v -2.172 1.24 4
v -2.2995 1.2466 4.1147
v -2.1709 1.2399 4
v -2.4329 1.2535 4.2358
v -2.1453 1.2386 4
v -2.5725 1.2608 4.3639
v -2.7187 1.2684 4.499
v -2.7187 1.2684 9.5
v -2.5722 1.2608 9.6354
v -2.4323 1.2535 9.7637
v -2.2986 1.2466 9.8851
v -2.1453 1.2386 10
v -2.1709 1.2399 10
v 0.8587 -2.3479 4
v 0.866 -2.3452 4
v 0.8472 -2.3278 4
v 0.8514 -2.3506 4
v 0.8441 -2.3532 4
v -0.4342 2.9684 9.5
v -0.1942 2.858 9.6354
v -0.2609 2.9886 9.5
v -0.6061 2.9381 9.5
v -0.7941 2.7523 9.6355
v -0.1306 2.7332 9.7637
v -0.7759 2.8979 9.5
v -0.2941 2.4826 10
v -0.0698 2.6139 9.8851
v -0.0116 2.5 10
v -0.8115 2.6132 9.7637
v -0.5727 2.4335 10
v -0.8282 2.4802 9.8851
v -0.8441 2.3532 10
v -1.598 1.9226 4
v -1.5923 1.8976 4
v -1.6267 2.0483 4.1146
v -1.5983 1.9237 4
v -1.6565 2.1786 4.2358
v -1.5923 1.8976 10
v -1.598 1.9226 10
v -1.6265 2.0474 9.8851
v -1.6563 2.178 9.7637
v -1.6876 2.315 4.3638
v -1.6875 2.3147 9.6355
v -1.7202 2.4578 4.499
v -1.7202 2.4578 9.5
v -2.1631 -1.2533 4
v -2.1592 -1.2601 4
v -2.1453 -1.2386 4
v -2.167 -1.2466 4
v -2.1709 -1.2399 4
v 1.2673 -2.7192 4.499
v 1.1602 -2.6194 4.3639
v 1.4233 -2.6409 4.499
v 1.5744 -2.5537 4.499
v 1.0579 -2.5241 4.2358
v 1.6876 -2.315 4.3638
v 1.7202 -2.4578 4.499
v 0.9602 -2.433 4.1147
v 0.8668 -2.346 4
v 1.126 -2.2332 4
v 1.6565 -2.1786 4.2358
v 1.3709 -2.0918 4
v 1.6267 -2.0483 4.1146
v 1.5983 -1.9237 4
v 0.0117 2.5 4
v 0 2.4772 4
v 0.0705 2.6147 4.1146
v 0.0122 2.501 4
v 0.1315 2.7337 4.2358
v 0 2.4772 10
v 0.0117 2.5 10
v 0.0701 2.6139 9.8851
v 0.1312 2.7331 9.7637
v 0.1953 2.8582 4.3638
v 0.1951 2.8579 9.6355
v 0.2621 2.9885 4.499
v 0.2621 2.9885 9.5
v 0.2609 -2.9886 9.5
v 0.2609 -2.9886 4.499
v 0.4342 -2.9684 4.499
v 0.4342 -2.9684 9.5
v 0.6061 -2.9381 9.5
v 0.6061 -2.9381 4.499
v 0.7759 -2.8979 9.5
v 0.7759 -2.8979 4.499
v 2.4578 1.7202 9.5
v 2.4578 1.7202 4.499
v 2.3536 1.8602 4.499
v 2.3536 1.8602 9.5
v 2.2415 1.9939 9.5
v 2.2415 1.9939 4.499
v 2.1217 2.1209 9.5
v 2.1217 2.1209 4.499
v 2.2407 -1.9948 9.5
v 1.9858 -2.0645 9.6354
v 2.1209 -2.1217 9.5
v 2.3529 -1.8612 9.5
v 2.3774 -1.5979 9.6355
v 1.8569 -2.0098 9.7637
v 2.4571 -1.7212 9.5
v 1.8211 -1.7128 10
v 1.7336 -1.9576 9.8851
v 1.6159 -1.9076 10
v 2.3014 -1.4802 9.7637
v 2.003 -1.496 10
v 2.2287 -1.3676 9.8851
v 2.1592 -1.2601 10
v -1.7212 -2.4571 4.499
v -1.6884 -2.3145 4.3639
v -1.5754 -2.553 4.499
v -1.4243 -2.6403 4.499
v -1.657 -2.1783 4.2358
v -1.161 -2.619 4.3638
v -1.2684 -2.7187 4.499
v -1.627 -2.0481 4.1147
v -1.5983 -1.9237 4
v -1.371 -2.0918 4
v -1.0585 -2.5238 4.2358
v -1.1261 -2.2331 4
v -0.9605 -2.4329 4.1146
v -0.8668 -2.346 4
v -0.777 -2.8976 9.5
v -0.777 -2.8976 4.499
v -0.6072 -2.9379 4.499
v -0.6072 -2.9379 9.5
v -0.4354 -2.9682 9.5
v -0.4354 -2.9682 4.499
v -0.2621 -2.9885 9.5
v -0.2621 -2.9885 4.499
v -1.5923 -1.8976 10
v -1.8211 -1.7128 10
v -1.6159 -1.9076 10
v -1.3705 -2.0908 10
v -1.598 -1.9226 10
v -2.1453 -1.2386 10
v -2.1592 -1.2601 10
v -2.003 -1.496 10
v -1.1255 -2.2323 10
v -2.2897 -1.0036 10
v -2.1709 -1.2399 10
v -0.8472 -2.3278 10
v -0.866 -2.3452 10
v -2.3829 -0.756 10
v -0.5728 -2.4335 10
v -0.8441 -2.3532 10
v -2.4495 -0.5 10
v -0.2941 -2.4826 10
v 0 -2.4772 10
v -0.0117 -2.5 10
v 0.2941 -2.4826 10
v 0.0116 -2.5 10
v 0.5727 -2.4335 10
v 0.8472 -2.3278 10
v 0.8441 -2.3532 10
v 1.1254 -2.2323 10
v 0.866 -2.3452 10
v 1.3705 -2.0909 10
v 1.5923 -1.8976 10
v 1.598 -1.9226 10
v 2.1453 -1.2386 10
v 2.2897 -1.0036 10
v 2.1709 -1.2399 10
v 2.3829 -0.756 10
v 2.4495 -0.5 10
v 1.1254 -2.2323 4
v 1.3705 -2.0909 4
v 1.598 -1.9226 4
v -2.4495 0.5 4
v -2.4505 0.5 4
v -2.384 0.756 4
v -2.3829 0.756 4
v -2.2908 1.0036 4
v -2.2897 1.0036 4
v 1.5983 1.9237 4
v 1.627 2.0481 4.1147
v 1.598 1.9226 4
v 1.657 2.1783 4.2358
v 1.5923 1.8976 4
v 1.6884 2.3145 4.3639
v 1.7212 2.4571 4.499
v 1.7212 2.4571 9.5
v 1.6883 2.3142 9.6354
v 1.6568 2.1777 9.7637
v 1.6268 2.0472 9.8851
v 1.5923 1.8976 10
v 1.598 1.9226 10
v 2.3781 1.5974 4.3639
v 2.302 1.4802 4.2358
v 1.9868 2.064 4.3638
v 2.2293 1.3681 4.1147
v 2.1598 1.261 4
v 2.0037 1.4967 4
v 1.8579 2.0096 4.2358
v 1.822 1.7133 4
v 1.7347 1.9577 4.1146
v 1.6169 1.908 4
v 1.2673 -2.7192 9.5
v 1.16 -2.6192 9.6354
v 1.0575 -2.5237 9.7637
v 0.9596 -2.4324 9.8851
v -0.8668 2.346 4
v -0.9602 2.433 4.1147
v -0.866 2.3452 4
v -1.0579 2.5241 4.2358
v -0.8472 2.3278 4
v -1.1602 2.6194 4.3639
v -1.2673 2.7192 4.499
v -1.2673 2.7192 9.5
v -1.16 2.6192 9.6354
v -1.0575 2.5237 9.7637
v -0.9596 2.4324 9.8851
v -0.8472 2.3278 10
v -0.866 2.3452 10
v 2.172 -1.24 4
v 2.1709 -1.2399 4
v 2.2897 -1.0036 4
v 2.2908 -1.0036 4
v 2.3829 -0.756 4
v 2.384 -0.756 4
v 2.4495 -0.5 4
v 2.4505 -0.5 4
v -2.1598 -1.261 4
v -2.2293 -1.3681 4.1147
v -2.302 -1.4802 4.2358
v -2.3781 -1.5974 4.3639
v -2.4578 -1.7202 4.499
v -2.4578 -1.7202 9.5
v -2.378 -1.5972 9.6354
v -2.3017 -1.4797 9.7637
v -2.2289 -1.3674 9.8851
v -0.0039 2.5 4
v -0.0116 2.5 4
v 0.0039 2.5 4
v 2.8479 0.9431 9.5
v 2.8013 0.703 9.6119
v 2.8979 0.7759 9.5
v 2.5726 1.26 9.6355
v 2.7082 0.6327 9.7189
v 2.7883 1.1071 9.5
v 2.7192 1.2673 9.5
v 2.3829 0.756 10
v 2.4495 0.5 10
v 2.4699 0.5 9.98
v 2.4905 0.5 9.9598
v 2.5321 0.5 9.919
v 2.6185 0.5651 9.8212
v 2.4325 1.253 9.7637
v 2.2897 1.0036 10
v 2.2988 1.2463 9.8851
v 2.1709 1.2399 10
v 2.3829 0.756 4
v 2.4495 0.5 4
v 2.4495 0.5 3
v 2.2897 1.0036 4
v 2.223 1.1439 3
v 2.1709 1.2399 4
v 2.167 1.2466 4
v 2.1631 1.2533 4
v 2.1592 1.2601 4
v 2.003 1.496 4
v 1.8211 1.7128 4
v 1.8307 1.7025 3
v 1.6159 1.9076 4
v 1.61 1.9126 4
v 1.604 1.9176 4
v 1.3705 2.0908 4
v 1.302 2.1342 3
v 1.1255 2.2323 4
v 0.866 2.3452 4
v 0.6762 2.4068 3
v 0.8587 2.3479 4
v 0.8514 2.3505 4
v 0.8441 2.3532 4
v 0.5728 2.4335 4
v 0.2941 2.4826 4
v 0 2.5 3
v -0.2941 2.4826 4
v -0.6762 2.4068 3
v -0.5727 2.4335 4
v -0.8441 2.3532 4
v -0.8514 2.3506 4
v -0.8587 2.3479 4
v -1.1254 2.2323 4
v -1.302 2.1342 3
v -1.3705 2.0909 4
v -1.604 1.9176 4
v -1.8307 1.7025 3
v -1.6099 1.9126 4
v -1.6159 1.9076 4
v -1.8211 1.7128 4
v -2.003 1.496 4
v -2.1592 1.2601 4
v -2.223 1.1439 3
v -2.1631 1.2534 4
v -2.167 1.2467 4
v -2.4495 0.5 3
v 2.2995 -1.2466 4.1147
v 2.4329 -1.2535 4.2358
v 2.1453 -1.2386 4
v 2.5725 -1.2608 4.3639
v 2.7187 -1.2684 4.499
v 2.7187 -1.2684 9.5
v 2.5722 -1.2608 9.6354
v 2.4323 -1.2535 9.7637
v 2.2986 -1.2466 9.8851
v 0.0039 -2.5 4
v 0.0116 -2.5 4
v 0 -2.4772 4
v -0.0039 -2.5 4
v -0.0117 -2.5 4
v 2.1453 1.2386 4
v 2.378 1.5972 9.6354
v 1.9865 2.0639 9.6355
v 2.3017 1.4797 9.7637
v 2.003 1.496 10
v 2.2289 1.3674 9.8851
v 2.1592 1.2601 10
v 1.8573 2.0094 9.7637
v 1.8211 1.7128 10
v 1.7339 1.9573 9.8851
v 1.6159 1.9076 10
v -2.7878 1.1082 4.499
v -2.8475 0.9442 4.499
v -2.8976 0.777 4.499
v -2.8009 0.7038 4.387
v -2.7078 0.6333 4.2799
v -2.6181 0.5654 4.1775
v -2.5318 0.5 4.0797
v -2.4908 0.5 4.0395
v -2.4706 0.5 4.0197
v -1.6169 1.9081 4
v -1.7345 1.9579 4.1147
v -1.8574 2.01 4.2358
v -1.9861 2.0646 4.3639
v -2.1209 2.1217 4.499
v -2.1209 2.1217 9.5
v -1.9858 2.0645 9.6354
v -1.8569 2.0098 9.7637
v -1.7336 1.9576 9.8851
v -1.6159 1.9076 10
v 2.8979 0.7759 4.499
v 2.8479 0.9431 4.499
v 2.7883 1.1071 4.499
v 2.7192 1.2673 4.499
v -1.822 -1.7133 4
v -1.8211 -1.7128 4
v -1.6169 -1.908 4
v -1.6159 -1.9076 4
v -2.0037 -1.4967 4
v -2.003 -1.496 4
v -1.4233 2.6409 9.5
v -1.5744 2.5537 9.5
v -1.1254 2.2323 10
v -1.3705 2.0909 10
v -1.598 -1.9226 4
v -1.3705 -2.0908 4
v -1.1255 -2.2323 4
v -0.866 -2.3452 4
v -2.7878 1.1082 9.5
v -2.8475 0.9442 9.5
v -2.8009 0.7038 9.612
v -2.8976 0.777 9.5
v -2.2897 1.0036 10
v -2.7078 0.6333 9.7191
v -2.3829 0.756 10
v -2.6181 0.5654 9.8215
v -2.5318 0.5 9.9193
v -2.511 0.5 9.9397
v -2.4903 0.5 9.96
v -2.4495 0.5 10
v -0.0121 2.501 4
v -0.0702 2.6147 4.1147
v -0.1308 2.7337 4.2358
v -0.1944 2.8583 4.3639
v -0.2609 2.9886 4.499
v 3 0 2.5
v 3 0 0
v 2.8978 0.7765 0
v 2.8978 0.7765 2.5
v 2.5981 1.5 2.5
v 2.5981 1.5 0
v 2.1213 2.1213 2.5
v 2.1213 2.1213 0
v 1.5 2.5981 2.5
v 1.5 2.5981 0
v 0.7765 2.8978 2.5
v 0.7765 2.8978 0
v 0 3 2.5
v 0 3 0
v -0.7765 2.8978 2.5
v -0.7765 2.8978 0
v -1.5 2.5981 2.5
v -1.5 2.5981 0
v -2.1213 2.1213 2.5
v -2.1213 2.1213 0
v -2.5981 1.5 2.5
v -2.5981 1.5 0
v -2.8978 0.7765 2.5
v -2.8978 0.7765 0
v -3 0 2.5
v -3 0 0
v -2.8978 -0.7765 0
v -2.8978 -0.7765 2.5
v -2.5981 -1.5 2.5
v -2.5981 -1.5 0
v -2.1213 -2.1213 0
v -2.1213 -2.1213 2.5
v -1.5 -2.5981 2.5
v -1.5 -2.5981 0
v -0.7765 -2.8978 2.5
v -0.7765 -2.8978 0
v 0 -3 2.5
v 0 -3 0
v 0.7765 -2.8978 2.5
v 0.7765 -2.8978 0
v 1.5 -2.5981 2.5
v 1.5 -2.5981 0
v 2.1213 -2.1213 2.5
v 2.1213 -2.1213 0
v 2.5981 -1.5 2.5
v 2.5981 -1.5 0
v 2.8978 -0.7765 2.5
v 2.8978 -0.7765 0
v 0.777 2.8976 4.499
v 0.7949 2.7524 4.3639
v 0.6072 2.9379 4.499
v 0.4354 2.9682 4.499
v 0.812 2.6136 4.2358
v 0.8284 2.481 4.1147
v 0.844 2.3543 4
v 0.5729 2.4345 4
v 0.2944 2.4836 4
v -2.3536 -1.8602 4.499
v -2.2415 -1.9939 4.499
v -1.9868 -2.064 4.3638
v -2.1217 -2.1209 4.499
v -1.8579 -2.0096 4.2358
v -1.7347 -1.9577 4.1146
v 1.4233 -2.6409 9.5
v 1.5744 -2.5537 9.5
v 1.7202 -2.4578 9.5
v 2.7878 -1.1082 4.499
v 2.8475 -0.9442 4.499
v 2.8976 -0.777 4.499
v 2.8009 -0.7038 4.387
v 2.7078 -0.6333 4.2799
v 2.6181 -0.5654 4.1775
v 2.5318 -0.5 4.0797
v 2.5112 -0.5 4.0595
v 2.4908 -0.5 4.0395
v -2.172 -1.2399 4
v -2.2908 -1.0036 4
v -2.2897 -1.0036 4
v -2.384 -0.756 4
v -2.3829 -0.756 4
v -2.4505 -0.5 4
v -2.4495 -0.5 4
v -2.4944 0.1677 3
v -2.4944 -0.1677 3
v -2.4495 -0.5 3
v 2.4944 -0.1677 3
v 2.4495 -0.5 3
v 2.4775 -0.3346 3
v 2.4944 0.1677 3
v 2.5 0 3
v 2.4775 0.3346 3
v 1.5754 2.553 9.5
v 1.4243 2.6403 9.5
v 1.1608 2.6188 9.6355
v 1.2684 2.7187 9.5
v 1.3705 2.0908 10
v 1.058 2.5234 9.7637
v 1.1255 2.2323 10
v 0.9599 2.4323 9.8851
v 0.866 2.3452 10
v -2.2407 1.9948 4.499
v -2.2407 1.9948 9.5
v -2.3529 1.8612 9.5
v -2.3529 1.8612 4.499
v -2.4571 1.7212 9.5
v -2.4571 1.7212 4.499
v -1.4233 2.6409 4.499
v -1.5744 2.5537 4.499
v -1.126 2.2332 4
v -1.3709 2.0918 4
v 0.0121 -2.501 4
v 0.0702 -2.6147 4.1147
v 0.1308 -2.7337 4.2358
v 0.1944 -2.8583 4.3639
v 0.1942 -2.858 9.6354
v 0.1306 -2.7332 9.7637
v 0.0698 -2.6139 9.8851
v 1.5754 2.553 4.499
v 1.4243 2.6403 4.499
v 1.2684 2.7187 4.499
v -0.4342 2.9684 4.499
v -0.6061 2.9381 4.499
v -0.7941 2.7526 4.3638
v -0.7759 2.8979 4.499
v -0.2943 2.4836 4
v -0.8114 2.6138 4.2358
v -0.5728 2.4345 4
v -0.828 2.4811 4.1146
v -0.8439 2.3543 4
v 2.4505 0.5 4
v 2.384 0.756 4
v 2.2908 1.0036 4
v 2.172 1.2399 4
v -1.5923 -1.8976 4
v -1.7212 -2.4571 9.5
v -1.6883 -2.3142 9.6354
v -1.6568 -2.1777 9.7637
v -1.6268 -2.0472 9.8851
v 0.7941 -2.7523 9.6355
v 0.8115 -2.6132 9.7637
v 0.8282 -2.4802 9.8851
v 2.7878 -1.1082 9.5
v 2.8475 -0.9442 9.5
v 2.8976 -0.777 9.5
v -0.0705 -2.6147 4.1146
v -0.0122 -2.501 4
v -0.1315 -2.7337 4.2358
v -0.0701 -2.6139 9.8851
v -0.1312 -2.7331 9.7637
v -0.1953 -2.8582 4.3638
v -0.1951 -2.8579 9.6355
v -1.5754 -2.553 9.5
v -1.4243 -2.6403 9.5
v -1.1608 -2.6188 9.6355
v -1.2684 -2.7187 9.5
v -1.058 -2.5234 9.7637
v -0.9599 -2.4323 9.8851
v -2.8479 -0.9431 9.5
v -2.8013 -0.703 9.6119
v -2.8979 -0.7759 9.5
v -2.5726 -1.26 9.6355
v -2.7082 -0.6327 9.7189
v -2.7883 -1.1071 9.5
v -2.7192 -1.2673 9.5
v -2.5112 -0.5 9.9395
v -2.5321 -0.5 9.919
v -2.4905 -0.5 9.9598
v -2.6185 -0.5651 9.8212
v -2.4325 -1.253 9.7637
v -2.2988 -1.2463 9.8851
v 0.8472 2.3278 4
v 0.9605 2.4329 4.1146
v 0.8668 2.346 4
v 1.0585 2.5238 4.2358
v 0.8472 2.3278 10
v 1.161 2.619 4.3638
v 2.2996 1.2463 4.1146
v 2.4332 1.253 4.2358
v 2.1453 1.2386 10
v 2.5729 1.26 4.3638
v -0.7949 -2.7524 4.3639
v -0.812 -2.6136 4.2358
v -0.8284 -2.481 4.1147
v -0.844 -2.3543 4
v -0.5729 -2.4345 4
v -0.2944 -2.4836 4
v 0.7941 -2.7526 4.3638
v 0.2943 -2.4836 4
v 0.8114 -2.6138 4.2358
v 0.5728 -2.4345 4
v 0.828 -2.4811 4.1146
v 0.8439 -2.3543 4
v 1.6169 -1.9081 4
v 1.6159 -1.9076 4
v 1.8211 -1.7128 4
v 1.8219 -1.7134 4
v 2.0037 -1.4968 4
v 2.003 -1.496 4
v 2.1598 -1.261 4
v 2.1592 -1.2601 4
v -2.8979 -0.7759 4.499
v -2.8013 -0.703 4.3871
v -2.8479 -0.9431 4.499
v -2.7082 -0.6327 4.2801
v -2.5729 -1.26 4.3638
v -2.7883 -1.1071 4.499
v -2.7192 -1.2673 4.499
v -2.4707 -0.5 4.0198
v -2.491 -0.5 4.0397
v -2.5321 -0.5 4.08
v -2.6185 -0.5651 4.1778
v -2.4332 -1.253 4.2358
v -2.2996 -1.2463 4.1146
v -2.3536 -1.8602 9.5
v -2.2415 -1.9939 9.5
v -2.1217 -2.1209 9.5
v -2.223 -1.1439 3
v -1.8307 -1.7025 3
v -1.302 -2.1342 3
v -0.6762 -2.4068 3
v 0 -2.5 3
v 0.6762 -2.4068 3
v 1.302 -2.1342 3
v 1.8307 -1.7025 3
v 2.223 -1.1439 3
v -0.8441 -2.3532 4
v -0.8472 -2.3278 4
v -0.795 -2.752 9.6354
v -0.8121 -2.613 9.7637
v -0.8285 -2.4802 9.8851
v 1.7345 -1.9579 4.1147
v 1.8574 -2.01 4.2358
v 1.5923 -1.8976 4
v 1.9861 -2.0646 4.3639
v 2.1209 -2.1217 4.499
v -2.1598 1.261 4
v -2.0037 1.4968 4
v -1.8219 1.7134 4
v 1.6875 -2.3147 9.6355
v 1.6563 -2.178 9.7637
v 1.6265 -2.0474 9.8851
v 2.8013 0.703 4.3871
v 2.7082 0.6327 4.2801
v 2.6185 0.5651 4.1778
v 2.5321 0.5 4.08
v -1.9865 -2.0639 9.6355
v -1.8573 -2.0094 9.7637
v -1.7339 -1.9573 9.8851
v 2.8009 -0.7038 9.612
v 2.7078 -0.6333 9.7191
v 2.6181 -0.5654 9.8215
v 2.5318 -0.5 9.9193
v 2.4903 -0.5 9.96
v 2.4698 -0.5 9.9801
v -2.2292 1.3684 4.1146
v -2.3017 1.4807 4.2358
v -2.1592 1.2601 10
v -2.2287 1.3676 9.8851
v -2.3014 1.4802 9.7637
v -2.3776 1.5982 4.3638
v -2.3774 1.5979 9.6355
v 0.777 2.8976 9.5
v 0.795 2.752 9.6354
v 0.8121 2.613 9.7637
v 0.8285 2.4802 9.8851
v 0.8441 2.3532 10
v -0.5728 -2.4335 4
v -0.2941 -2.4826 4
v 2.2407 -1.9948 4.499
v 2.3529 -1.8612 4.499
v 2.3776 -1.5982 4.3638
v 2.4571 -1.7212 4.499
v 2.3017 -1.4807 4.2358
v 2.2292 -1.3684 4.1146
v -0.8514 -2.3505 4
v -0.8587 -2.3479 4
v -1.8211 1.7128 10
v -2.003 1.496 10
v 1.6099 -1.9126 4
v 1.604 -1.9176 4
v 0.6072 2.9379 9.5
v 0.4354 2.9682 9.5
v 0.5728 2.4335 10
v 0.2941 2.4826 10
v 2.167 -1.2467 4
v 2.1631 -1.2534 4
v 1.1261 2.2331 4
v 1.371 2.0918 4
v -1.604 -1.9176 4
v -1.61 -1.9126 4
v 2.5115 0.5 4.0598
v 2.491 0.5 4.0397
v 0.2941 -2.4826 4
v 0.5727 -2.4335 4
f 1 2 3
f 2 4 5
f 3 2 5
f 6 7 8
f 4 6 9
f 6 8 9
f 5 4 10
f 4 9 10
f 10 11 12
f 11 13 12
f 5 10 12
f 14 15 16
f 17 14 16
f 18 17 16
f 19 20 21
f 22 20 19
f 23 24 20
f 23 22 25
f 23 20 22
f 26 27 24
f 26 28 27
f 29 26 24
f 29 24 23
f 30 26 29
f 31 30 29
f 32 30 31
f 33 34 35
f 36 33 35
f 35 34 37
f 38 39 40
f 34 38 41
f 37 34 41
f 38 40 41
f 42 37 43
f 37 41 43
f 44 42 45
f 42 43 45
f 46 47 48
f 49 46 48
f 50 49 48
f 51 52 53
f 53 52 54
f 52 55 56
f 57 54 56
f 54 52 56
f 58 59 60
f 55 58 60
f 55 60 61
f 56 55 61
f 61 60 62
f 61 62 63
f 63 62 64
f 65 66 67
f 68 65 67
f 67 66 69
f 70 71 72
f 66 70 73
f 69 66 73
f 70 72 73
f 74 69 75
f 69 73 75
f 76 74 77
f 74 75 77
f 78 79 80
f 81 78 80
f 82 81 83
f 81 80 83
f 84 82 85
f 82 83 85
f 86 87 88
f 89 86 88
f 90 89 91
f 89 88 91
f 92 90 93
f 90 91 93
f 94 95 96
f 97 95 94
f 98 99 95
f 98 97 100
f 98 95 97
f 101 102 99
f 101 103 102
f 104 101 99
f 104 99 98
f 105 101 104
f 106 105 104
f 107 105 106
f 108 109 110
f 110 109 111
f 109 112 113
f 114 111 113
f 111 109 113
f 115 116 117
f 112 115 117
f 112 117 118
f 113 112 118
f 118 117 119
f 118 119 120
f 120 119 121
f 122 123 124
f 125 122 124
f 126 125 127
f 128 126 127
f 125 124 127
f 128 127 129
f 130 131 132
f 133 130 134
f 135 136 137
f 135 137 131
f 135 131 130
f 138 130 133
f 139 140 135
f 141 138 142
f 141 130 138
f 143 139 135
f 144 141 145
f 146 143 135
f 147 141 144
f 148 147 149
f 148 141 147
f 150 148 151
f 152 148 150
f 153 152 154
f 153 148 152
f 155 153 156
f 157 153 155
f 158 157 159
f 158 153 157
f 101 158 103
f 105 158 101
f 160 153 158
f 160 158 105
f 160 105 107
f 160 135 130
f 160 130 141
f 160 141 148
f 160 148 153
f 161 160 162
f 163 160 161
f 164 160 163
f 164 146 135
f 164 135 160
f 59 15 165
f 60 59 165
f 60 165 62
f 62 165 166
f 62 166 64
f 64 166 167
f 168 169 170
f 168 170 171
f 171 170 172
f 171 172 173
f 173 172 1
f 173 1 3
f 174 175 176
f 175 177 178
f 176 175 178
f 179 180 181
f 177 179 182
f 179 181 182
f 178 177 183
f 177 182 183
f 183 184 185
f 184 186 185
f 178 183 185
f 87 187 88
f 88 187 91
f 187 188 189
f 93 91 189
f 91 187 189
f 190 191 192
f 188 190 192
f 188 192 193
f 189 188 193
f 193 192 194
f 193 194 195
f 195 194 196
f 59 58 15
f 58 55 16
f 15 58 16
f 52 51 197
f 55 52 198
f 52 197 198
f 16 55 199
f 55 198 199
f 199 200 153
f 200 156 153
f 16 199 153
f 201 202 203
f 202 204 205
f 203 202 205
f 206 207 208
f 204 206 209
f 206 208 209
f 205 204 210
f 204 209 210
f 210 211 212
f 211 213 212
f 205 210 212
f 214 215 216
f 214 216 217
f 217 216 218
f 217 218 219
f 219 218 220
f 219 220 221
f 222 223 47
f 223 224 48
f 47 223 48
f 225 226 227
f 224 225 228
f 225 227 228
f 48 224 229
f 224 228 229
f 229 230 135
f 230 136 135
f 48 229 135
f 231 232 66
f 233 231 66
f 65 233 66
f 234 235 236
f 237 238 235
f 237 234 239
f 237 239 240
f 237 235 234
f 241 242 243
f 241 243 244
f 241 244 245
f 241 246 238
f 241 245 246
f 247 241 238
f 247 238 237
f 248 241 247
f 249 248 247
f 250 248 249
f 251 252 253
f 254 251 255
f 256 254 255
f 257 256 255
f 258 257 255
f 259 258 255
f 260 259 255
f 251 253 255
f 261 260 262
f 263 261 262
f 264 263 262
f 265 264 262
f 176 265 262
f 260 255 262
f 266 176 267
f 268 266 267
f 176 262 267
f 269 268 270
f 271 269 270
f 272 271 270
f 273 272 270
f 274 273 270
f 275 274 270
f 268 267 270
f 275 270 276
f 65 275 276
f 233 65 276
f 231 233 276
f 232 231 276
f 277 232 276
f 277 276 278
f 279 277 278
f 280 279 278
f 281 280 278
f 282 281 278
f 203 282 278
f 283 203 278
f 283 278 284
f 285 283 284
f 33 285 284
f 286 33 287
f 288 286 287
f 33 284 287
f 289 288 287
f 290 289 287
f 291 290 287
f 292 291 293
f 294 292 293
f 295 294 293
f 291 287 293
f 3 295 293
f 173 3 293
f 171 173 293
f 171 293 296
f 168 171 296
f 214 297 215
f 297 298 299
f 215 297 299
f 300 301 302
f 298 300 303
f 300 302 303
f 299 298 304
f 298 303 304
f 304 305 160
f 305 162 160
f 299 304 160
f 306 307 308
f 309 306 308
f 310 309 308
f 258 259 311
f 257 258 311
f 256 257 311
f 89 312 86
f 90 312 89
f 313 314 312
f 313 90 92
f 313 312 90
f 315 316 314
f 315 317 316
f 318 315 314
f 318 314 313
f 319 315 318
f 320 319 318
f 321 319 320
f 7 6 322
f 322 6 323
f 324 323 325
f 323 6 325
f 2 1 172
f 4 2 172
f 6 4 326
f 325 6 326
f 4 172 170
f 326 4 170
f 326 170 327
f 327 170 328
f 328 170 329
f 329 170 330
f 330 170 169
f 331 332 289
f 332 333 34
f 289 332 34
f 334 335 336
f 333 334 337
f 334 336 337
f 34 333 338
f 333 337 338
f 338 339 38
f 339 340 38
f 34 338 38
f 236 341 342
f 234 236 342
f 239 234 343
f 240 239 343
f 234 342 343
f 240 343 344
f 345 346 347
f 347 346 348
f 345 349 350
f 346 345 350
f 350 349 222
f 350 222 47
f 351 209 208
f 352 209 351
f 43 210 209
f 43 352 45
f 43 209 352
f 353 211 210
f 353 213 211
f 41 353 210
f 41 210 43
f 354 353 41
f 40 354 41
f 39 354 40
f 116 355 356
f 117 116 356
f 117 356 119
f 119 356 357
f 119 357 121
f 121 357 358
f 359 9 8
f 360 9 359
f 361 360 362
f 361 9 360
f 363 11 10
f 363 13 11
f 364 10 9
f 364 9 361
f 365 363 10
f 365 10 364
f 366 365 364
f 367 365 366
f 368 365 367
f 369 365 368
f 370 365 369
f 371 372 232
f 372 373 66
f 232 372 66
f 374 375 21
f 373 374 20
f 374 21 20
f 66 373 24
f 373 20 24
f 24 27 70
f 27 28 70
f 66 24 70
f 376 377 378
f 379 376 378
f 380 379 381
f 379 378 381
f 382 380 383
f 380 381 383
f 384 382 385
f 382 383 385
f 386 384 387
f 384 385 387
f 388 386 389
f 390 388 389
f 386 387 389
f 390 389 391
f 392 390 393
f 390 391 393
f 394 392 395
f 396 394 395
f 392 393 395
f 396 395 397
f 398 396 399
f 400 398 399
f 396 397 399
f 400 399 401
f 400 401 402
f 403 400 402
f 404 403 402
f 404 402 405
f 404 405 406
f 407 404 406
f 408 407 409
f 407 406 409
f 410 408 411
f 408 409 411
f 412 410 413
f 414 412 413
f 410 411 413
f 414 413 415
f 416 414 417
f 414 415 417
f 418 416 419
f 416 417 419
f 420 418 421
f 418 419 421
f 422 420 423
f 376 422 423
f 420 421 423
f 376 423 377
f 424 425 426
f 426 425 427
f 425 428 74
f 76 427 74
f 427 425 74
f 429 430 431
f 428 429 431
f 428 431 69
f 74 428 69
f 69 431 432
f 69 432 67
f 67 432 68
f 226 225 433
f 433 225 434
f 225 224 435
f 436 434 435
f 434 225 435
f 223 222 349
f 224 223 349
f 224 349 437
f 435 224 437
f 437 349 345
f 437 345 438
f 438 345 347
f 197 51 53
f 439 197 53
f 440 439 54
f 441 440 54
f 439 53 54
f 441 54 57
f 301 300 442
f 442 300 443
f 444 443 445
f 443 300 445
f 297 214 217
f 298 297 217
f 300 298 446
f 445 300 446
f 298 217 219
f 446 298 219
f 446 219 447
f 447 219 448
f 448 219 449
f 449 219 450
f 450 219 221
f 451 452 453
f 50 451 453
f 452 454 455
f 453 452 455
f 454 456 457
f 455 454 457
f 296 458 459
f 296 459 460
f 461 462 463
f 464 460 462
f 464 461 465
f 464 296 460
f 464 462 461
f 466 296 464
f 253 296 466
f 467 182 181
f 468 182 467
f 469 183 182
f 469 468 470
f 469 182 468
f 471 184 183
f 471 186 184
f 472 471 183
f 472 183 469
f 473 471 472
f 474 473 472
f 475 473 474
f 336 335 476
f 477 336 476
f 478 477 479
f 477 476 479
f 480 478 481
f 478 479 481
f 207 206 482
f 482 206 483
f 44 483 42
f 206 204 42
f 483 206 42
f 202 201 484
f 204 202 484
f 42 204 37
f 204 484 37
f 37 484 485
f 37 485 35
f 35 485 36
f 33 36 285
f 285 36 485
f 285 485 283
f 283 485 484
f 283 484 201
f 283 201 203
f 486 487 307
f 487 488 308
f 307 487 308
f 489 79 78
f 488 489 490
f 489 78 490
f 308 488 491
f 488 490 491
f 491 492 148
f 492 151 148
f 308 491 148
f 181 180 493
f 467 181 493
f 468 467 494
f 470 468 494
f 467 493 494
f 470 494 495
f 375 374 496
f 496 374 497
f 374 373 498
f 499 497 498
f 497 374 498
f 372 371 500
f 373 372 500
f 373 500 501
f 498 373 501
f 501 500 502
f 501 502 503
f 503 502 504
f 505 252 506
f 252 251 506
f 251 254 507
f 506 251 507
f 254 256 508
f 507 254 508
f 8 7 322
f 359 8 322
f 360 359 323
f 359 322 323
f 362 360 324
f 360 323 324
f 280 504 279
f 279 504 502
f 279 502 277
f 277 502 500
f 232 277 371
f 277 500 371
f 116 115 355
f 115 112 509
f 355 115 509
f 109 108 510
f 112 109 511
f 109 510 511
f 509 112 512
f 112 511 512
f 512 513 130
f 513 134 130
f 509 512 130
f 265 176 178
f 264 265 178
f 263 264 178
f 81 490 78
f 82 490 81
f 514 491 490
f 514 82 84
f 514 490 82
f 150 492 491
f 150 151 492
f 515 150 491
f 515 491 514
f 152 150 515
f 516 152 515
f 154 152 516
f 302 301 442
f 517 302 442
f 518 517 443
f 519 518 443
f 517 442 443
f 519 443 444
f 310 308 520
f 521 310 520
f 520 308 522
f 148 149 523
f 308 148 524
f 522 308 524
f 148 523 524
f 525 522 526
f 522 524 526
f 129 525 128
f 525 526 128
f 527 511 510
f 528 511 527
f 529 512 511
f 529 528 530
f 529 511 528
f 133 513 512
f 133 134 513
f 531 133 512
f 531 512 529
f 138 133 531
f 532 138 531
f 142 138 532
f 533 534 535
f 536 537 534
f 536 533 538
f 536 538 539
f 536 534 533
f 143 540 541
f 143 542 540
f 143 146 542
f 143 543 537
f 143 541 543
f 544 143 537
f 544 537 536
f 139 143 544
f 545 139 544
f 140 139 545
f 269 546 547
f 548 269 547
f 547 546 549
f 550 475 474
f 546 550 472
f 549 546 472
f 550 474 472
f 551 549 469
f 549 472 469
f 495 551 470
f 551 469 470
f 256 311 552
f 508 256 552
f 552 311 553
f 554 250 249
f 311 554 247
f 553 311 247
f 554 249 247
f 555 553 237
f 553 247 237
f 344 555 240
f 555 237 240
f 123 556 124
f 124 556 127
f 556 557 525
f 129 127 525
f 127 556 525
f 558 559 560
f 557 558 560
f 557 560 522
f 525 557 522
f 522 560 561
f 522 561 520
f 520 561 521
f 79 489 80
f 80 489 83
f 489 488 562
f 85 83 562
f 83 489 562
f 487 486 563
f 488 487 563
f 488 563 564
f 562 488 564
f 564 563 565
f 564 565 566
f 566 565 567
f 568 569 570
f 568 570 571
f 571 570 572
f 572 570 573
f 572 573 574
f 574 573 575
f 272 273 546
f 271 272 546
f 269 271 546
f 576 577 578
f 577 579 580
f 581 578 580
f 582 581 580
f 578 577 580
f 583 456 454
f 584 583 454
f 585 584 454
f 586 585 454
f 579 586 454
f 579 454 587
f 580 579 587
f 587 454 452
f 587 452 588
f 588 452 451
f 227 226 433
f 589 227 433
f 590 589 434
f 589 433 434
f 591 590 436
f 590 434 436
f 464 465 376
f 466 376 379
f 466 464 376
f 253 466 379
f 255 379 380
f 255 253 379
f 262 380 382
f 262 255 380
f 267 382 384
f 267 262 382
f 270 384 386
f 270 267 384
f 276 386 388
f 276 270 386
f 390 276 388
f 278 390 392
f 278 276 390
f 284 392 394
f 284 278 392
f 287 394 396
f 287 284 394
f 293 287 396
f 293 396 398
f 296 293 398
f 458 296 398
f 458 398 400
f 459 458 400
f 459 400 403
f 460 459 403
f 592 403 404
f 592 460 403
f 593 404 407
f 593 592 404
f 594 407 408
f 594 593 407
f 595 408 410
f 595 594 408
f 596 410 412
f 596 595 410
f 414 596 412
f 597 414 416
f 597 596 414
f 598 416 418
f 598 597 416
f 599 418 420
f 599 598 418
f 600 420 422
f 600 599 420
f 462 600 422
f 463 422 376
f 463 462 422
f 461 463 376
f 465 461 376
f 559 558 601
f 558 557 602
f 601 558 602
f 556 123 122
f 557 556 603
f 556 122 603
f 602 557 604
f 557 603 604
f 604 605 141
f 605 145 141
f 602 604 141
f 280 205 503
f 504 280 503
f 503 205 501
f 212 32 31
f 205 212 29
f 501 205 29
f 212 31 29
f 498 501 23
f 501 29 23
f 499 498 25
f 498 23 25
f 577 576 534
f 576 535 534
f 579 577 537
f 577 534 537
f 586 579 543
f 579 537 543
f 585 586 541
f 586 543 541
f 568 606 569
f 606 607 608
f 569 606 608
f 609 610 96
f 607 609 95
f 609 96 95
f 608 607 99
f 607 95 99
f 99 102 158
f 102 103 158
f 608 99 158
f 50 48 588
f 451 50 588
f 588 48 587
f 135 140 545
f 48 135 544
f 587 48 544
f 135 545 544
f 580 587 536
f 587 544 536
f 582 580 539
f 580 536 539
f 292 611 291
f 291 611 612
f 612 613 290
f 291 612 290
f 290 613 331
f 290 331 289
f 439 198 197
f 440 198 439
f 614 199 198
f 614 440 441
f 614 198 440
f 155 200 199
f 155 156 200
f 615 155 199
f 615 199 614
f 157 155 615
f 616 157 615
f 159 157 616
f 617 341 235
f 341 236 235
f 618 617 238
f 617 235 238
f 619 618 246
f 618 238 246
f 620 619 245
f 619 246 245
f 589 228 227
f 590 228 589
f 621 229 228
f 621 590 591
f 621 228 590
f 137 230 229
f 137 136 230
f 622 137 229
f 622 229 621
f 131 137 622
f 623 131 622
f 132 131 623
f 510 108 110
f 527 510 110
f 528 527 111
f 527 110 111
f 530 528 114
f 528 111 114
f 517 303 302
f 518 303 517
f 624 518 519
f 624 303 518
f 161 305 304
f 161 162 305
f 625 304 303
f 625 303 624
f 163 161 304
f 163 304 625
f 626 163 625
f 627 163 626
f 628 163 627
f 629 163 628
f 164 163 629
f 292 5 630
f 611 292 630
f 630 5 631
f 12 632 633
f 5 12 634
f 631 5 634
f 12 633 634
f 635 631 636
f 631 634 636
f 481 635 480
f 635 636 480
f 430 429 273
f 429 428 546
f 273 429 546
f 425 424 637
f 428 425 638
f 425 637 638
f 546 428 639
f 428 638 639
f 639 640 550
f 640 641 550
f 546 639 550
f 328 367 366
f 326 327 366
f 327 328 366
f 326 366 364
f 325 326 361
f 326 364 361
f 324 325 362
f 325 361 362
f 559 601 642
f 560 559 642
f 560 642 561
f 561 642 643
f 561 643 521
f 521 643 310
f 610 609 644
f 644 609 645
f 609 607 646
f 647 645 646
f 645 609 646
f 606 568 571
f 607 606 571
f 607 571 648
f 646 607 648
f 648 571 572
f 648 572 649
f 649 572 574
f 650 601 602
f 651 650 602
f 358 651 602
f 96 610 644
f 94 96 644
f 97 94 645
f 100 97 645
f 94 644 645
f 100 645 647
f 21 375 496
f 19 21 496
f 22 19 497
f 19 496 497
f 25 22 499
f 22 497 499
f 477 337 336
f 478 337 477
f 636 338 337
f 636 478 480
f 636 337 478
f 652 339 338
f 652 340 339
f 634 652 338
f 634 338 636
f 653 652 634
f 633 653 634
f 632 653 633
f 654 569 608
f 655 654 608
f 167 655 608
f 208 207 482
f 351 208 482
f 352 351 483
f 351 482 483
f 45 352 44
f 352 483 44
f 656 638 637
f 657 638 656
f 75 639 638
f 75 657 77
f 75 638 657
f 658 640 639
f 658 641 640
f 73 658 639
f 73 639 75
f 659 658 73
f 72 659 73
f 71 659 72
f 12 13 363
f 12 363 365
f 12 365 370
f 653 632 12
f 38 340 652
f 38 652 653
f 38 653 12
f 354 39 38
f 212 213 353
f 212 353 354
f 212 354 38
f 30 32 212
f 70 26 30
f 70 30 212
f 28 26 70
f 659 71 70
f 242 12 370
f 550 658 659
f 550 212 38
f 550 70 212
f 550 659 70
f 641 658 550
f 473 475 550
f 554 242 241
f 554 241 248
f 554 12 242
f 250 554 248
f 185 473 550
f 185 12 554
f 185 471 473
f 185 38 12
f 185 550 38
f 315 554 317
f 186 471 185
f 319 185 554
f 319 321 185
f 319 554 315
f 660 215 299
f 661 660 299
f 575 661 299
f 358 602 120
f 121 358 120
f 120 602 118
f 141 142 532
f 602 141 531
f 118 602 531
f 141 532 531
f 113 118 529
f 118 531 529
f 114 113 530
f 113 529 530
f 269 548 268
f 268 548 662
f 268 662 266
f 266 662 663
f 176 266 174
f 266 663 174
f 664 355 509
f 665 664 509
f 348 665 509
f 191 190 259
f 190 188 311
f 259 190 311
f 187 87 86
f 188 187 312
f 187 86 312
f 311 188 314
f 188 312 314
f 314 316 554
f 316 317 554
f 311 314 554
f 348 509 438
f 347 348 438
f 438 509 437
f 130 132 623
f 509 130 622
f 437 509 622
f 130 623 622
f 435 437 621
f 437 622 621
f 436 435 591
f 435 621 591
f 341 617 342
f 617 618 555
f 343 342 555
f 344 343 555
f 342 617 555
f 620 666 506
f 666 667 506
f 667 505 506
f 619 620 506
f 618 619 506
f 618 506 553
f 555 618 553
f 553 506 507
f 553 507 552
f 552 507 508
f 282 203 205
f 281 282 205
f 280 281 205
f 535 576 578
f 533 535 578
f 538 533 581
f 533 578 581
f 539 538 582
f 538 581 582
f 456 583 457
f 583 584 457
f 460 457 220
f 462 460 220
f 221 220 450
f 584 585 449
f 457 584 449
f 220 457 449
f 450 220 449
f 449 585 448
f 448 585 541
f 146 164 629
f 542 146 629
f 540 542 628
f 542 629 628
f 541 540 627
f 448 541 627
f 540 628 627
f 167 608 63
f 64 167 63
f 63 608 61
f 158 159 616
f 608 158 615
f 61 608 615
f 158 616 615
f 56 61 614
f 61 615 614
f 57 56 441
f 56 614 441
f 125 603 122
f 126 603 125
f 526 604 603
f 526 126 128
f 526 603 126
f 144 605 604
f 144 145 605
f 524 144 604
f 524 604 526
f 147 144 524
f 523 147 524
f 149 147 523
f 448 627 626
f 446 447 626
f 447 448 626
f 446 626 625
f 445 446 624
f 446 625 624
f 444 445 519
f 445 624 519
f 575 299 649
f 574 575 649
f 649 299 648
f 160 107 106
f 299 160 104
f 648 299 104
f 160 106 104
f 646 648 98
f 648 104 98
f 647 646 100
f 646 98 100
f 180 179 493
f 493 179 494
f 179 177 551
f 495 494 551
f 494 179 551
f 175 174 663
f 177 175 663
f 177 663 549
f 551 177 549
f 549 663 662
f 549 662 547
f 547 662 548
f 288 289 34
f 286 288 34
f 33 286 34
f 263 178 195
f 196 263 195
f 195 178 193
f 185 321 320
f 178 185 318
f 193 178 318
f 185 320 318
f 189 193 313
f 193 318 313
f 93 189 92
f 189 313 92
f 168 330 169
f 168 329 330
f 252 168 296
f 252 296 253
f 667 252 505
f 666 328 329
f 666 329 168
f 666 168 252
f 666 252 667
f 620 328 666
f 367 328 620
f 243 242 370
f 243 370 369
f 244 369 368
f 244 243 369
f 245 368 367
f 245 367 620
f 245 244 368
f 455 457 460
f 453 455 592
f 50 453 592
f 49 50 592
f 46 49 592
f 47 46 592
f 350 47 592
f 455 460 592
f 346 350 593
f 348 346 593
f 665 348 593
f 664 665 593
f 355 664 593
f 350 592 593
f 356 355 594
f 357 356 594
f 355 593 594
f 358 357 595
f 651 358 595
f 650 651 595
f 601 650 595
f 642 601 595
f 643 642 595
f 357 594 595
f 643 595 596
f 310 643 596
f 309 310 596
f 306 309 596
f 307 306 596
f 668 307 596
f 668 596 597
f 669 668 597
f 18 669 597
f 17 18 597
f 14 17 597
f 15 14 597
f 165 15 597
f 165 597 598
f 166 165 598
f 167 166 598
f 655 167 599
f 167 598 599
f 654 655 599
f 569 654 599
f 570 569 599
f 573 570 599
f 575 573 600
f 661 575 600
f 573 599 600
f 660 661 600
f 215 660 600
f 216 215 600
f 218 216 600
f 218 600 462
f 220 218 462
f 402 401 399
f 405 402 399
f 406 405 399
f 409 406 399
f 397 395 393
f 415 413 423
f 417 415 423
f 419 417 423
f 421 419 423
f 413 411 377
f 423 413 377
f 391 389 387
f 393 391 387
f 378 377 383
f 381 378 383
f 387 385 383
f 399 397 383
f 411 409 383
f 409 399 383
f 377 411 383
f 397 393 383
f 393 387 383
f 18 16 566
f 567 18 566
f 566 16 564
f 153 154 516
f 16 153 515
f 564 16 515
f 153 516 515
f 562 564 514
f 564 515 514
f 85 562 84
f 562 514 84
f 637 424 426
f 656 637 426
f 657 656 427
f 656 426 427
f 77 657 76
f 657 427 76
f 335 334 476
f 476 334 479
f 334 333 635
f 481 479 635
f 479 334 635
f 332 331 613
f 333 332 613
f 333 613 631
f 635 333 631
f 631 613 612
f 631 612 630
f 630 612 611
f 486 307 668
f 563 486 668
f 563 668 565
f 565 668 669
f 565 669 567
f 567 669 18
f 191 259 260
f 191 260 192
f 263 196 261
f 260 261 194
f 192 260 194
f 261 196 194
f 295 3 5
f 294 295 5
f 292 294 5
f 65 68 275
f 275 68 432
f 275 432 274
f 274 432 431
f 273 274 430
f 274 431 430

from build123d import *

# Parameters (mm, degrees)
SKETCH_R           = 3
PAD_DEPTH          = 3
CHAMFER_SIZE       = 0.5
SKETCH001_R        = 2.5
PAD001_DEPTH       = 1
SKETCH002_R        = 3
PAD002_DEPTH       = 6
CHAMFER001_SIZE    = 0.499
CHAMFER002_SIZE    = 0.5
POCKET_DEPTH       = 6
POLARPATTERN_COUNT = 18
SKETCH004_W        = 7
SKETCH004_H        = 1
POCKET001_DEPTH    = 7


with BuildPart() as part:
    # Sketch → Pad (new body)
    with BuildSketch(Plane.XY):
        Circle(SKETCH_R)
    extrude(amount=PAD_DEPTH)

    # Chamfer
    chamfer_edges = [part.edges().sort_by_distance(p)[0] for p in [
        (-3, 0, 3),
    ]]
    chamfer(chamfer_edges, length=CHAMFER_SIZE)

    # Sketch001 → Pad001 (join)
    with BuildSketch(Plane.XY.offset(3)):
        Circle(SKETCH001_R)
    extrude(amount=PAD001_DEPTH)

    # Sketch002 → Pad002 (join)
    with BuildSketch(Plane.XY.offset(4)):
        Circle(SKETCH002_R)
    extrude(amount=PAD002_DEPTH)

    # Chamfer001
    chamfer001_edges = [part.edges().sort_by_distance(p)[0] for p in [
        (-3, 0, 4),
    ]]
    chamfer(chamfer001_edges, length=CHAMFER001_SIZE)

    # Chamfer002
    chamfer002_edges = [part.edges().sort_by_distance(p)[0] for p in [
        (-3, 0, 10),
    ]]
    chamfer(chamfer002_edges, length=CHAMFER002_SIZE)

    # Sketch003 → Pocket (cut)
    with BuildSketch(Plane.XY.offset(10)):
        with BuildLine():
            ThreePointArc((0.262071, 2.988531), (0.000606, 3), (-0.260863, 2.988637))
            Line((-0.260863, 2.988637), (0, 2.477175))
            Line((0, 2.477175), (0.262071, 2.988531))
        make_face()
    pocket = extrude(amount=-POCKET_DEPTH, mode=Mode.SUBTRACT)

    # PolarPattern: Pocket ×18 about axis
    polarpattern_axis = Axis((0, 0, 10), (0, 0, 1))
    for i in range(1, POLARPATTERN_COUNT):
        add(pocket.rotate(polarpattern_axis, i * 360 / POLARPATTERN_COUNT), mode=Mode.SUBTRACT)

    # Sketch004 → Pocket001 (cut)
    with BuildSketch(Plane.XY.offset(10)):
        Rectangle(SKETCH004_W, SKETCH004_H)
    extrude(amount=-POCKET001_DEPTH, mode=Mode.SUBTRACT)


solid = part.part
